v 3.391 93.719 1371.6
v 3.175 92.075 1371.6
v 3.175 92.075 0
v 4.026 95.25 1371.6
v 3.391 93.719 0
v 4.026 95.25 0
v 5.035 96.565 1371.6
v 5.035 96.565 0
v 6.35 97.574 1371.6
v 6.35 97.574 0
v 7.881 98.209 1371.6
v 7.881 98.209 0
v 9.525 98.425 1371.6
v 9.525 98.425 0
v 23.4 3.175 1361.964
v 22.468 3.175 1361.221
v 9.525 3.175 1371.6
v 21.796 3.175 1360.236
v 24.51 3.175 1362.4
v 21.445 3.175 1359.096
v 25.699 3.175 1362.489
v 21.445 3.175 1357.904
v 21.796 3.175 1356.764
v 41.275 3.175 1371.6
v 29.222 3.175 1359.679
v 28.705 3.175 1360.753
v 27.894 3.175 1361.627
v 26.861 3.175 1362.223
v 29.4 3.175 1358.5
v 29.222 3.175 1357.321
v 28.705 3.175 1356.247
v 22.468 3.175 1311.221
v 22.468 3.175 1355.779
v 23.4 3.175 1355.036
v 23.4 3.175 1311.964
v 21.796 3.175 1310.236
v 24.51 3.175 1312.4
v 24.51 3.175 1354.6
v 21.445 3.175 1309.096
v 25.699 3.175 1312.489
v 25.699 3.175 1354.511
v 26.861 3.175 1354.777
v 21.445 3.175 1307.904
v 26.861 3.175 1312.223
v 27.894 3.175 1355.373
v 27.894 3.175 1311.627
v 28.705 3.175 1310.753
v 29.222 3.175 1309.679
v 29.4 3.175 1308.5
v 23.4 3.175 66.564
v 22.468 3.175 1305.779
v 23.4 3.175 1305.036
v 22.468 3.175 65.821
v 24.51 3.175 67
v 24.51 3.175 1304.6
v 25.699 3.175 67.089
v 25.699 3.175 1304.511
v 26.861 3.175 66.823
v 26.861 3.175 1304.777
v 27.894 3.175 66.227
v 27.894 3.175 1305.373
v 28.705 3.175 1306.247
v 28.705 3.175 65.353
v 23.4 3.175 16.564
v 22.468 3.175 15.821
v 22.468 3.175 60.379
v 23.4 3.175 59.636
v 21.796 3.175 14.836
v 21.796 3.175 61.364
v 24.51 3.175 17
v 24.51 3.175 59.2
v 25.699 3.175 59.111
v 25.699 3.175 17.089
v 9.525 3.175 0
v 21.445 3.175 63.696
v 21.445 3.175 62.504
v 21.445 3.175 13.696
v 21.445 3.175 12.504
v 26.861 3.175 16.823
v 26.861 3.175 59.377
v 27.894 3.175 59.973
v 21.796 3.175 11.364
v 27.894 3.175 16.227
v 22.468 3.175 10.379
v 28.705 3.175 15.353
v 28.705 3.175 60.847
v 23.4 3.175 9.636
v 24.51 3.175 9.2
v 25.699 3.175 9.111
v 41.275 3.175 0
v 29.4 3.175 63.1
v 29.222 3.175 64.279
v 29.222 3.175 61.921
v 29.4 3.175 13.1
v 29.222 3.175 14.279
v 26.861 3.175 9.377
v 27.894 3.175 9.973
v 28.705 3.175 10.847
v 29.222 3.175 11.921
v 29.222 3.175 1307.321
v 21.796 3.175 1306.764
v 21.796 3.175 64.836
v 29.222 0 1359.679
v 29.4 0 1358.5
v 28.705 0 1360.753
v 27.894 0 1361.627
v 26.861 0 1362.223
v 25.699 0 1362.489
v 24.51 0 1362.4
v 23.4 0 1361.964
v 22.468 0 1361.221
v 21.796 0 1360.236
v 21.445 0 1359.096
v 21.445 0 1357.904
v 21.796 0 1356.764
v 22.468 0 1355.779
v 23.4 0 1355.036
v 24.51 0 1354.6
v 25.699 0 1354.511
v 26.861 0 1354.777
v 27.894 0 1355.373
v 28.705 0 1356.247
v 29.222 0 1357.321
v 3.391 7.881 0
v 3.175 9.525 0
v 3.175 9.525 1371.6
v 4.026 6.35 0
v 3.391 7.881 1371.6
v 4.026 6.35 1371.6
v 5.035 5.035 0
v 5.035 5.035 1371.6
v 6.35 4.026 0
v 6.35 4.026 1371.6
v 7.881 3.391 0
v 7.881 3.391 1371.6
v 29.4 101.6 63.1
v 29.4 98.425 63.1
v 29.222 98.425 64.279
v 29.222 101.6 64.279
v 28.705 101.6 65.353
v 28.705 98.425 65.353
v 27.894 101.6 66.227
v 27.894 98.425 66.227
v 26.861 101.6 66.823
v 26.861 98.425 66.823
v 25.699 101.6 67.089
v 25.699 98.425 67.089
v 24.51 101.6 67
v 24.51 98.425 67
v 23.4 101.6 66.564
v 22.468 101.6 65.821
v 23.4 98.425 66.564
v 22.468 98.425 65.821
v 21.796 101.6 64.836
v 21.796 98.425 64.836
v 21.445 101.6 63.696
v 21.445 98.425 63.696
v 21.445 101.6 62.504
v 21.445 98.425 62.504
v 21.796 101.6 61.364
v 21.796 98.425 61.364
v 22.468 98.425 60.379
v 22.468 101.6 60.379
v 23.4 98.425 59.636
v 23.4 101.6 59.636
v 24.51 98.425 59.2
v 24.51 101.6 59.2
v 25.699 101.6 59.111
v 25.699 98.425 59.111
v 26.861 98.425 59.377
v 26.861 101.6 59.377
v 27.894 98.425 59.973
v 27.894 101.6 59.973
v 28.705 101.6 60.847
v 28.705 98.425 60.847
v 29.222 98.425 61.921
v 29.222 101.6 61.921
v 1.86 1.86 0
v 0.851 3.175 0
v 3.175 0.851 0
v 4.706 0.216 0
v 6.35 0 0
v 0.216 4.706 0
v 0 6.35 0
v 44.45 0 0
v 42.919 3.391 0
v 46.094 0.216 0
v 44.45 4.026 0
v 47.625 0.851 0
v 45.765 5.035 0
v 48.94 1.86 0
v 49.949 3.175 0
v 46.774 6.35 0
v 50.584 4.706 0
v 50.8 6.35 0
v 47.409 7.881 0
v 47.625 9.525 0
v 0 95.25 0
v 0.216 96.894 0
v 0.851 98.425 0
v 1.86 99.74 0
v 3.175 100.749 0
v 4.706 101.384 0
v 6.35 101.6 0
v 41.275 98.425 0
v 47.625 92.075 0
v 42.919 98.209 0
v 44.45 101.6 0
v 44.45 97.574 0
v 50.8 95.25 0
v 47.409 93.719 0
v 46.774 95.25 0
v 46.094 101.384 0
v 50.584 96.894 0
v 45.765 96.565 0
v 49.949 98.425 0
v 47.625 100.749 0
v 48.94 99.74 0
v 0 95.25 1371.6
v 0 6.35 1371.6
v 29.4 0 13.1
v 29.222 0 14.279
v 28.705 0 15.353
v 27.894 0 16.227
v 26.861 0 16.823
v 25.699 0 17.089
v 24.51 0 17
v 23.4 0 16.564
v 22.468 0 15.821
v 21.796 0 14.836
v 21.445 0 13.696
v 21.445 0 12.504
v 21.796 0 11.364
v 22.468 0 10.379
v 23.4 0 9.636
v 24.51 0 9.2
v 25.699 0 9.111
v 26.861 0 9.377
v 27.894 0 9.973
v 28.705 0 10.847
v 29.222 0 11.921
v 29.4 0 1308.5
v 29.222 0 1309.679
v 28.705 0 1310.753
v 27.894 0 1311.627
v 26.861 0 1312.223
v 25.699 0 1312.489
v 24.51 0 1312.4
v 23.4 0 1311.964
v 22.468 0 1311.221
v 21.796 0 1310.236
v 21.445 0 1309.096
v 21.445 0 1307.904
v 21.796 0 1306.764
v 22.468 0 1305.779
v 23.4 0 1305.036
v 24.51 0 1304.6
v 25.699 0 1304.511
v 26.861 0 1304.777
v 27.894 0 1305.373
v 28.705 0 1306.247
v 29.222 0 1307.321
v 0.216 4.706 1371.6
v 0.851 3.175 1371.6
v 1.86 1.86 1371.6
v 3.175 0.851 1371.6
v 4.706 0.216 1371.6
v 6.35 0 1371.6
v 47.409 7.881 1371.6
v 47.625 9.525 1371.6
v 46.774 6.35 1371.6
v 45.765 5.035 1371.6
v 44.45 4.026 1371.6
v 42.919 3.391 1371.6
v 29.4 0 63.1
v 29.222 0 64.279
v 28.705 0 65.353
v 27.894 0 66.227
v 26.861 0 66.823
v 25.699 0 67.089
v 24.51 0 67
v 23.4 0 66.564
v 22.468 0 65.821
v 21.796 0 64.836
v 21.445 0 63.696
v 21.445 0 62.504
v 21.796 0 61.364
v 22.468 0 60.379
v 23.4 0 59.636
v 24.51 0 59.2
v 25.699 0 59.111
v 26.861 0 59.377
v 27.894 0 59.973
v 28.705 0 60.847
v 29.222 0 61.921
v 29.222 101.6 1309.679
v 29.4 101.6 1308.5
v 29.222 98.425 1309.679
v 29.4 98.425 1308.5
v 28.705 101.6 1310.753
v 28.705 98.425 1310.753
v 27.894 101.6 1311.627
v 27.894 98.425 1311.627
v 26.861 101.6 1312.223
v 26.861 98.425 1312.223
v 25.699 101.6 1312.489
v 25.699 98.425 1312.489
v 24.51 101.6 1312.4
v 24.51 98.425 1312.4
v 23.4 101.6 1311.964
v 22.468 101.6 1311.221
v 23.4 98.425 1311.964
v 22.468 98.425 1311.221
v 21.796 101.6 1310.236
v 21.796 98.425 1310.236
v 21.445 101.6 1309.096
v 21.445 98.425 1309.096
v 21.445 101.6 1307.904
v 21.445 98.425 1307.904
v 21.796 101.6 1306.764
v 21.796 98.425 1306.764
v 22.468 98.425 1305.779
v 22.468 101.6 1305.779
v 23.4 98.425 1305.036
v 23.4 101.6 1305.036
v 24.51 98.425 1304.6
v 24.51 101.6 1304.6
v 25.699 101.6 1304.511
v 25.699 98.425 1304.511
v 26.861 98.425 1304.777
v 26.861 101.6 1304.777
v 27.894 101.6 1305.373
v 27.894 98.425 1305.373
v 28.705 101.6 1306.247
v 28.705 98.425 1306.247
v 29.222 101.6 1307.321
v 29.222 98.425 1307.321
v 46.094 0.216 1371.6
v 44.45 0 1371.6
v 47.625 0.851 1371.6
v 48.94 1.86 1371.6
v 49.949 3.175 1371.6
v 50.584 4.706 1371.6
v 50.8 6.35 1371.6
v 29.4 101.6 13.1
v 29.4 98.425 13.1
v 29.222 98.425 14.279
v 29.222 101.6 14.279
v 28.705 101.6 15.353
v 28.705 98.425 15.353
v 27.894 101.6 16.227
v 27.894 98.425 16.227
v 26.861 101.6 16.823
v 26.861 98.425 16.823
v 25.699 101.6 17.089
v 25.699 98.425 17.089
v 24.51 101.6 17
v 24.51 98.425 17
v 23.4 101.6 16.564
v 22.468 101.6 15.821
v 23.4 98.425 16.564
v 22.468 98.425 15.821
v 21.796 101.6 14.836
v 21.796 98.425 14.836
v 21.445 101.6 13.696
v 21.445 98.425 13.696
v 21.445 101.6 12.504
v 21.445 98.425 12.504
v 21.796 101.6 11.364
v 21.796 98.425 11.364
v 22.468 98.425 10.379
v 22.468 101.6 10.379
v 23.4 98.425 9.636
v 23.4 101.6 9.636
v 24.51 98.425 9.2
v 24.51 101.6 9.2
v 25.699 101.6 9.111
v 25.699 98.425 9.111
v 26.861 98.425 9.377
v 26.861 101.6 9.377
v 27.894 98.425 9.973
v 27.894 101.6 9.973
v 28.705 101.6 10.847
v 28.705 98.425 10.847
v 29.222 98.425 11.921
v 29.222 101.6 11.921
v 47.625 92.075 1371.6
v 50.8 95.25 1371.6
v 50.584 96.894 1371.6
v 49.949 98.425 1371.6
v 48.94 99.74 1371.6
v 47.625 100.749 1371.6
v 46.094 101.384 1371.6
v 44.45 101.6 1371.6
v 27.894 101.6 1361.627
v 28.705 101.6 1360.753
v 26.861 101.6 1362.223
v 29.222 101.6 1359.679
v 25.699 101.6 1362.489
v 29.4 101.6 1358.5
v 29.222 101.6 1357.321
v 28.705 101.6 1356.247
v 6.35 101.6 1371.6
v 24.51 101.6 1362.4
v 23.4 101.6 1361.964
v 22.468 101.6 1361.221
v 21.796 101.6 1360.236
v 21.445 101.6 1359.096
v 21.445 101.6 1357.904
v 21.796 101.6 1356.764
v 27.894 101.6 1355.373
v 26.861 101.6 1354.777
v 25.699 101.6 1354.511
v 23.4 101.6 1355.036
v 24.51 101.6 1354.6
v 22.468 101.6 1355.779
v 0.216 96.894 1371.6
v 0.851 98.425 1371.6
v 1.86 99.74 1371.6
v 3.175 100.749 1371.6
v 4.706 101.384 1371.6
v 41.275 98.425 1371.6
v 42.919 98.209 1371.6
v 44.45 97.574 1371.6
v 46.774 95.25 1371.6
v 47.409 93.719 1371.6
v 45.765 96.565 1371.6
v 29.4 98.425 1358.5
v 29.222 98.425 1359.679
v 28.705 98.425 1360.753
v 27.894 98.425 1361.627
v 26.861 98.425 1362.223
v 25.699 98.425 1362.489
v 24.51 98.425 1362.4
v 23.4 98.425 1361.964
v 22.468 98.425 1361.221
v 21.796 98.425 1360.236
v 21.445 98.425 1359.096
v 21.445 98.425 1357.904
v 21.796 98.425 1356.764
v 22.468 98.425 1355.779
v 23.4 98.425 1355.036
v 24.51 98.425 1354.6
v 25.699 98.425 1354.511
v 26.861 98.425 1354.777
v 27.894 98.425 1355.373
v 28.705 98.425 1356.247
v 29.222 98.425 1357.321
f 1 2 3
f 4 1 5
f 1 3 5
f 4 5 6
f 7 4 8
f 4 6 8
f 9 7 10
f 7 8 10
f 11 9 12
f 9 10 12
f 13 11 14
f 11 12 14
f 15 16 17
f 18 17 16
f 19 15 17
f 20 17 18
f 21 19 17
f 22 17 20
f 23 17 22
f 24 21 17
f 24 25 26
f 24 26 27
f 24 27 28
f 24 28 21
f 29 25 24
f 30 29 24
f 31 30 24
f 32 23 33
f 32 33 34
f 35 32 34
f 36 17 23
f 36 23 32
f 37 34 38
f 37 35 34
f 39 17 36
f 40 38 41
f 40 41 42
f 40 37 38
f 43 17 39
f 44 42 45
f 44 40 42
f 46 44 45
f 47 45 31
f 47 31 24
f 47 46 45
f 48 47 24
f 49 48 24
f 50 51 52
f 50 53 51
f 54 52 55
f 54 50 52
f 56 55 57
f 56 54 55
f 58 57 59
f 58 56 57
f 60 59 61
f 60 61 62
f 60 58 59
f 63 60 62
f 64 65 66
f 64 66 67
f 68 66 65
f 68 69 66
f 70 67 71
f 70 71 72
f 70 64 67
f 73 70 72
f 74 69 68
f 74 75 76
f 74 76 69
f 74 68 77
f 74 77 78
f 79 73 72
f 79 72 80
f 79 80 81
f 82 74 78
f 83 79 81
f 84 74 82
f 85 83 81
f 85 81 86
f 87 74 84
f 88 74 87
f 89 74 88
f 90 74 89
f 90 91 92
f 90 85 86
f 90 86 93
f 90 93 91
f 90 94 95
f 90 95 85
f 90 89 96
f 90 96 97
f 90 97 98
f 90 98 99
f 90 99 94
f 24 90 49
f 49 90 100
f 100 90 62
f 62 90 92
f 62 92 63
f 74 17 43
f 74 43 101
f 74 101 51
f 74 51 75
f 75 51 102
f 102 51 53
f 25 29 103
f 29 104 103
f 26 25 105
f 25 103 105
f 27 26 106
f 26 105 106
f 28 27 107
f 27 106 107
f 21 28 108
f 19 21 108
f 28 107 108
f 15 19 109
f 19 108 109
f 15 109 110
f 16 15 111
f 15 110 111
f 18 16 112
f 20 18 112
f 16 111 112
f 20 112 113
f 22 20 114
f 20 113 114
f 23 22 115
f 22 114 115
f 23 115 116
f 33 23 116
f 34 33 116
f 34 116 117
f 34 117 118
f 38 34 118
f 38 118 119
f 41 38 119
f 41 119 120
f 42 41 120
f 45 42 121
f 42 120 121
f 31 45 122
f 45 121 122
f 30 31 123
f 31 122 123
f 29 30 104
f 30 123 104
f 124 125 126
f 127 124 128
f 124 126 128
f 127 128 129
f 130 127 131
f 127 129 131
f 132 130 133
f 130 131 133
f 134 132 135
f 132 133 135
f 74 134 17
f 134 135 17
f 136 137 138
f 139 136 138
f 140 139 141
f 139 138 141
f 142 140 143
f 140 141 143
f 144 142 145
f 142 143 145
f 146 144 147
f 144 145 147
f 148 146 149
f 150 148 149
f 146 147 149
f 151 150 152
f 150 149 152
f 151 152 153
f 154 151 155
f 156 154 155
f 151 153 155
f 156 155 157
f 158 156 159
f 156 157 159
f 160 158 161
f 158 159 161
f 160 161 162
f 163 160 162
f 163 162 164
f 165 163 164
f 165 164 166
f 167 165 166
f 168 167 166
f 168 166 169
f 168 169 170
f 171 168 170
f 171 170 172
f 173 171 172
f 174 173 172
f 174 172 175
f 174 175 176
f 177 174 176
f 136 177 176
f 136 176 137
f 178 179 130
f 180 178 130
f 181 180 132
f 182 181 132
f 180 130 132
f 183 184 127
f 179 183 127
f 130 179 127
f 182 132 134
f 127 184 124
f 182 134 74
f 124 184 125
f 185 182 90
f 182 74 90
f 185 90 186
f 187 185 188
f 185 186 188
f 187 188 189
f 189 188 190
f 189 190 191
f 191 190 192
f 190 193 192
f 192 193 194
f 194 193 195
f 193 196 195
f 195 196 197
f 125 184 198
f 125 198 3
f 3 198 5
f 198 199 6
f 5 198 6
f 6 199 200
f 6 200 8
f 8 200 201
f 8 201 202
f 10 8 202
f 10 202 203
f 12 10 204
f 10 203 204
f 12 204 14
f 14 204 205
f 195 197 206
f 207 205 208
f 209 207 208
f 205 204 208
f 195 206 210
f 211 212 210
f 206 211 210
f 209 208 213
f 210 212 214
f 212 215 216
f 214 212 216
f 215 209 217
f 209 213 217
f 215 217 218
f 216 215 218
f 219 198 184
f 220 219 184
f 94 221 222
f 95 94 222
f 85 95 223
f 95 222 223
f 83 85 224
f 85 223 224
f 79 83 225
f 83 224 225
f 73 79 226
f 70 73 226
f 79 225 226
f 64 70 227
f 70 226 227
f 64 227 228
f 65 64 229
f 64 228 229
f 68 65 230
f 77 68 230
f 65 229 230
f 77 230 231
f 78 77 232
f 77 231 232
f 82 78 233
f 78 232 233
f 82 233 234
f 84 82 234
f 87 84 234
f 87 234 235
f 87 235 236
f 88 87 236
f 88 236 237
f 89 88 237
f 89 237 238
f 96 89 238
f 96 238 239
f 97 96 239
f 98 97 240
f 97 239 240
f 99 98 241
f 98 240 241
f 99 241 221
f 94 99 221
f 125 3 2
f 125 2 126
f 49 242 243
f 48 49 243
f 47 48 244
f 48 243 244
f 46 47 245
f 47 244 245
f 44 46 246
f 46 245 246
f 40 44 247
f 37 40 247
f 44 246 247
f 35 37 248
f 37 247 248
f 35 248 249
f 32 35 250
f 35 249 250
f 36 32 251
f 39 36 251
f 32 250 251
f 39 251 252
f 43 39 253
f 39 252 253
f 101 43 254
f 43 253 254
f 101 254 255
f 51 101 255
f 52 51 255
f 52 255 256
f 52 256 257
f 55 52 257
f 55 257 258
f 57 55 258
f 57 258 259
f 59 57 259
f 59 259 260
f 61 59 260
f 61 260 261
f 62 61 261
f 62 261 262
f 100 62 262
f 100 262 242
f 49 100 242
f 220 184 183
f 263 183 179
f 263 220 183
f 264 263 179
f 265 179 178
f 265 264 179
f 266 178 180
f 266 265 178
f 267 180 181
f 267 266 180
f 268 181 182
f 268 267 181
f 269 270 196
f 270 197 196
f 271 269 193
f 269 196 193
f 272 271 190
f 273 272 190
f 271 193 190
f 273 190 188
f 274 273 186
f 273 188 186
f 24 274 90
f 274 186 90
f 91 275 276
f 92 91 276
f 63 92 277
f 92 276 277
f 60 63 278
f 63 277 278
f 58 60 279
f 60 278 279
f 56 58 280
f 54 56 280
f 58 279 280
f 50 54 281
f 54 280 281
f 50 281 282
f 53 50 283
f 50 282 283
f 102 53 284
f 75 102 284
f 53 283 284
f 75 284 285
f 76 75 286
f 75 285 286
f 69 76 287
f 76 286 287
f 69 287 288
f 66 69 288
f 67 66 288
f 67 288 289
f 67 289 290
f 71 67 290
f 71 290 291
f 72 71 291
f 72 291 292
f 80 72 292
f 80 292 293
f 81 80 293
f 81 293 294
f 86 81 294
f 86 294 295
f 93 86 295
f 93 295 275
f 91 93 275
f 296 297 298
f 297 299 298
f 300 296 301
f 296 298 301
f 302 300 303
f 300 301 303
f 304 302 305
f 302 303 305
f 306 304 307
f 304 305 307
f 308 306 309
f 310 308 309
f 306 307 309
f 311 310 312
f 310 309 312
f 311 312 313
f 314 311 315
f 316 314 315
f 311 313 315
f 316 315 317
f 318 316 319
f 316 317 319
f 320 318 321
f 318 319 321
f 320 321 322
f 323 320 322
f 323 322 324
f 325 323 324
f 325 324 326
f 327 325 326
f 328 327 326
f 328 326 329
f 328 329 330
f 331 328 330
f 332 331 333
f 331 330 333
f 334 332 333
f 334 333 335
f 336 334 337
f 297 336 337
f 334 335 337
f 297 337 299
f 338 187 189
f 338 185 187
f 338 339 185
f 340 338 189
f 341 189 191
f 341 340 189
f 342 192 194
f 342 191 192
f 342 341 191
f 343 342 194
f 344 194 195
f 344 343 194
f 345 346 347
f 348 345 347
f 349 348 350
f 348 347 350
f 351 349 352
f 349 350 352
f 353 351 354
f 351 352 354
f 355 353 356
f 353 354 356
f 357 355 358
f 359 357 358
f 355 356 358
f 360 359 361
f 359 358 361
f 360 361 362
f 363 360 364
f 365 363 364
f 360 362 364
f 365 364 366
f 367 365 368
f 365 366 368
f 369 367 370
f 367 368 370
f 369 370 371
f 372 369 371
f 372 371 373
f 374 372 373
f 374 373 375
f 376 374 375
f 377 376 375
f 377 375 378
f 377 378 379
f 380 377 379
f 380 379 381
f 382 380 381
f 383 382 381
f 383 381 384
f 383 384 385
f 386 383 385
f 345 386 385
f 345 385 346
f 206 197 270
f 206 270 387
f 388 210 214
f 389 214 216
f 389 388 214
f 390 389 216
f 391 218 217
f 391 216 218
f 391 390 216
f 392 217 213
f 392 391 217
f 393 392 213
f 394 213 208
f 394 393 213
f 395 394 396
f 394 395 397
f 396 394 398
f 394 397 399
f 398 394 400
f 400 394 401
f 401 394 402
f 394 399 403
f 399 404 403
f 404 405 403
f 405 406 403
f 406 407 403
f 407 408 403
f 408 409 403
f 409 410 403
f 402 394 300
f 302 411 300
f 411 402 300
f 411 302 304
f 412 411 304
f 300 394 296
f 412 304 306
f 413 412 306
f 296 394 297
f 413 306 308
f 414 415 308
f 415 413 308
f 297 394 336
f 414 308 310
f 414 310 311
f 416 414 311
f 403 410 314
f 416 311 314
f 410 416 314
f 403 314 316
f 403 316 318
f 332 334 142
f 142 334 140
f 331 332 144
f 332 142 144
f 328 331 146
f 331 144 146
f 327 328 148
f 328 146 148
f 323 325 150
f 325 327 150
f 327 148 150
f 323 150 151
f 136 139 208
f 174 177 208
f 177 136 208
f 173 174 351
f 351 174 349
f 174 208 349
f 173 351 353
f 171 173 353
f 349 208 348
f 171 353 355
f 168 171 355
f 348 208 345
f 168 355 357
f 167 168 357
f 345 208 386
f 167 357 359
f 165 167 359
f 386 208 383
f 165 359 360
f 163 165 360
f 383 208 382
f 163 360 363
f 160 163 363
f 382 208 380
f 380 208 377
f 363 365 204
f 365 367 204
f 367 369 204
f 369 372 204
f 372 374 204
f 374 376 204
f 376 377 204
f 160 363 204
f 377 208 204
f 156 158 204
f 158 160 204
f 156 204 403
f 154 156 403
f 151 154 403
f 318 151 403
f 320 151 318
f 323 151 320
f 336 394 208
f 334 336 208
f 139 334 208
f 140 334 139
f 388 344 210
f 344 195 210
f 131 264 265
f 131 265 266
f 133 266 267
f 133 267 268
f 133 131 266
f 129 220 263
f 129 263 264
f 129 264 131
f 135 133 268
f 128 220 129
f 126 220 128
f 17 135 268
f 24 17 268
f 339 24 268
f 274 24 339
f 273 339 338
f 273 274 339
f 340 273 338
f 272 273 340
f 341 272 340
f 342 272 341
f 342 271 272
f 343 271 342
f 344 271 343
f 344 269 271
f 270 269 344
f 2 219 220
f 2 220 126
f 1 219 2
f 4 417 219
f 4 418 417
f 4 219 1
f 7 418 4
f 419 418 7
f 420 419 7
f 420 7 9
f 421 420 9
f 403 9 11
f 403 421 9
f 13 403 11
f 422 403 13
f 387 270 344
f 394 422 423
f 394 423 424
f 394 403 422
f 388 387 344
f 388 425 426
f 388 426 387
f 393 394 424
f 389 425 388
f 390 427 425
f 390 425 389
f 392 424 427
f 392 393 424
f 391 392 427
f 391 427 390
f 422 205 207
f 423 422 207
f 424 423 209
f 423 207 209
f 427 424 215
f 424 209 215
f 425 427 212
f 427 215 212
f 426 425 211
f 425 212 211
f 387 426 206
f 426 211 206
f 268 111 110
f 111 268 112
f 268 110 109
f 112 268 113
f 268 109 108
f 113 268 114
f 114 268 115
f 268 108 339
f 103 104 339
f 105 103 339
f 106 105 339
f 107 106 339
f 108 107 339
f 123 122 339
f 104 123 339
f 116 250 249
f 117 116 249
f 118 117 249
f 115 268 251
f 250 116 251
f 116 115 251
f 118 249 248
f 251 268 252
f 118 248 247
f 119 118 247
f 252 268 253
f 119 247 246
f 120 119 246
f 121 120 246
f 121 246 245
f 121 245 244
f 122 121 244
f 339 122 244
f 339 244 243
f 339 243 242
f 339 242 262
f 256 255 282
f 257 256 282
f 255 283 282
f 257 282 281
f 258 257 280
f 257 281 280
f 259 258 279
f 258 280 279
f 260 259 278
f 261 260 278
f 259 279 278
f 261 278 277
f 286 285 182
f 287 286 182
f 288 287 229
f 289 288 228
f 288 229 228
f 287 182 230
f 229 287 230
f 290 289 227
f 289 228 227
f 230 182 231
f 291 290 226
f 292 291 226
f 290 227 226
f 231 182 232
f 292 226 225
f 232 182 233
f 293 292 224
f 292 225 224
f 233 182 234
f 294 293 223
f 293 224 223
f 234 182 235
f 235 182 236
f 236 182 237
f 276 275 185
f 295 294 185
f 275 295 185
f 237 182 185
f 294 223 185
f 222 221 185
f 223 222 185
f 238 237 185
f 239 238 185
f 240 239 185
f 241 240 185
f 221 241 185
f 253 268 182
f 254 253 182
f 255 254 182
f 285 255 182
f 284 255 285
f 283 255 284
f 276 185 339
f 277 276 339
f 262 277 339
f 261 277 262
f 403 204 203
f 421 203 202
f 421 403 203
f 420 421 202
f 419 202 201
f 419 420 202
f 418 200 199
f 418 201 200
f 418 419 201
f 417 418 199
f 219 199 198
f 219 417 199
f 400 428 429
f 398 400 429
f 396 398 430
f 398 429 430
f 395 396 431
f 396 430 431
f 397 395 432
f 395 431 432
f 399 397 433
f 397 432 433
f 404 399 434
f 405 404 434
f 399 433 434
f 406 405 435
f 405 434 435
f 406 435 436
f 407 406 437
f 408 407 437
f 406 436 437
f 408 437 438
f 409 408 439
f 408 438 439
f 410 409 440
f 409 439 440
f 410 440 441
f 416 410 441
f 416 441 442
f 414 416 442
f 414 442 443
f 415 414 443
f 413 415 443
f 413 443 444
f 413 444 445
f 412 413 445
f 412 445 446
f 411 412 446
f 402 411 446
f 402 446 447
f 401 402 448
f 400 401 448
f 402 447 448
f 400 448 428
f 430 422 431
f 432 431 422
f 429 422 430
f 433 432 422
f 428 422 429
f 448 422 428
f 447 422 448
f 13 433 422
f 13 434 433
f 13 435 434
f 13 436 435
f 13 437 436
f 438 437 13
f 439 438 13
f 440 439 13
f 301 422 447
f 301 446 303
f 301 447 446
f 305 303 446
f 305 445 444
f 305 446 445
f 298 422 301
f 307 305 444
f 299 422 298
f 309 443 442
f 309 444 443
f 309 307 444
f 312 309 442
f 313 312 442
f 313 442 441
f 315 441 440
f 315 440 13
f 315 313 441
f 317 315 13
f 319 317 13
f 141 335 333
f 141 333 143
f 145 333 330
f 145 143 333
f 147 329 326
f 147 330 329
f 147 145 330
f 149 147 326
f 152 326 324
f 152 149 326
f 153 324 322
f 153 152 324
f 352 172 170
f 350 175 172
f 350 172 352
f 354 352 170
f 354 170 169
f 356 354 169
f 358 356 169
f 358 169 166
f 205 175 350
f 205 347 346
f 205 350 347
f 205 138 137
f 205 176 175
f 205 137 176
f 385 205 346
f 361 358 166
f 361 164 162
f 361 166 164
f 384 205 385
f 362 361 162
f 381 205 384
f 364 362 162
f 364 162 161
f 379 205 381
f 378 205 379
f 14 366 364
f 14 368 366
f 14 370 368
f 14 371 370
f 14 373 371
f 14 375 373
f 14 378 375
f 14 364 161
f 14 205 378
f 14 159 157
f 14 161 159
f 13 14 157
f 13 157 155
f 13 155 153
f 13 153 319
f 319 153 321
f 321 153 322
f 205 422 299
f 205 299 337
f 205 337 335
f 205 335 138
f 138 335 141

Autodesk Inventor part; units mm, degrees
ref_plane "YZ Plane" through (0, 0, 0) normal (1, 0, 0) x (0, 1, 0)
ref_plane "XZ Plane" through (0, 0, 0) normal (0, 1, 0) x (-1, 0, 0)
ref_plane "XY Plane" through (0, 0, 0) normal (0, 0, 1) x (1, 0, 0)
sketch "Sketch1" plane through (0, 0, 0) normal (0, 0, 1) x (1, 0, 0)
  line L0 (0, 0) -> (50.8, 0)
  line L1 (50.8, 0) -> (50.8, 101.6)
  line L2 (50.8, 101.6) -> (0, 101.6)
  line L3 (0, 101.6) -> (0, 0)
  dimension "d0" = 101.6
  dimension "d1" = 50.8
extrude "Extrusion1" add sketch "Sketch1" along normal blind 1371.6
shell "Shell1" thickness 3.175 removed faces 2 at (16.9333, 67.7333, 0) at (16.9333, 67.7333, 1371.6)
fillet "Fillet1" radius 6.35 8 edges at (3.175, 3.175, 685.8) (47.625, 3.175, 685.8) (3.175, 98.425, 685.8) (47.625, 98.425, 685.8) (50.8, 101.6, 685.8) (50.8, 0, 685.8) (0, 0, 685.8) (0, 101.6, 685.8)
sketch "Sketch2" plane through (6.35, 0, 0) normal (0, -1, 0) x (1, 0, 0)
  circle A0 centre (19.05, 63.1) radius 4
  circle A1 centre (19.05, 13.1) radius 4
  line L0 (19.05, 63.1) -> (19.05, 13.1) construction
  line L1 (0, 0) -> (38.1, 0) construction
  line L2 (38.1, 1371.6) -> (38.1, 0) construction
  line L3 (38.1, 685.8) -> (-101.1432, 685.8) construction
  circle A2 centre (19.05, 1308.5) radius 4
  circle A3 centre (19.05, 1358.5) radius 4
  point P0 (-6.35, 0)
  point P1 (19.05, 38.1)
  point P2 (19.05, 0)
  dimension "d6" = 8
  dimension "d7" = 38.1
  dimension "d8" = 50
extrude "Extrusion2" cut sketch "Sketch2" against normal blind 1244.6
properties part number "2x4_Tube"
